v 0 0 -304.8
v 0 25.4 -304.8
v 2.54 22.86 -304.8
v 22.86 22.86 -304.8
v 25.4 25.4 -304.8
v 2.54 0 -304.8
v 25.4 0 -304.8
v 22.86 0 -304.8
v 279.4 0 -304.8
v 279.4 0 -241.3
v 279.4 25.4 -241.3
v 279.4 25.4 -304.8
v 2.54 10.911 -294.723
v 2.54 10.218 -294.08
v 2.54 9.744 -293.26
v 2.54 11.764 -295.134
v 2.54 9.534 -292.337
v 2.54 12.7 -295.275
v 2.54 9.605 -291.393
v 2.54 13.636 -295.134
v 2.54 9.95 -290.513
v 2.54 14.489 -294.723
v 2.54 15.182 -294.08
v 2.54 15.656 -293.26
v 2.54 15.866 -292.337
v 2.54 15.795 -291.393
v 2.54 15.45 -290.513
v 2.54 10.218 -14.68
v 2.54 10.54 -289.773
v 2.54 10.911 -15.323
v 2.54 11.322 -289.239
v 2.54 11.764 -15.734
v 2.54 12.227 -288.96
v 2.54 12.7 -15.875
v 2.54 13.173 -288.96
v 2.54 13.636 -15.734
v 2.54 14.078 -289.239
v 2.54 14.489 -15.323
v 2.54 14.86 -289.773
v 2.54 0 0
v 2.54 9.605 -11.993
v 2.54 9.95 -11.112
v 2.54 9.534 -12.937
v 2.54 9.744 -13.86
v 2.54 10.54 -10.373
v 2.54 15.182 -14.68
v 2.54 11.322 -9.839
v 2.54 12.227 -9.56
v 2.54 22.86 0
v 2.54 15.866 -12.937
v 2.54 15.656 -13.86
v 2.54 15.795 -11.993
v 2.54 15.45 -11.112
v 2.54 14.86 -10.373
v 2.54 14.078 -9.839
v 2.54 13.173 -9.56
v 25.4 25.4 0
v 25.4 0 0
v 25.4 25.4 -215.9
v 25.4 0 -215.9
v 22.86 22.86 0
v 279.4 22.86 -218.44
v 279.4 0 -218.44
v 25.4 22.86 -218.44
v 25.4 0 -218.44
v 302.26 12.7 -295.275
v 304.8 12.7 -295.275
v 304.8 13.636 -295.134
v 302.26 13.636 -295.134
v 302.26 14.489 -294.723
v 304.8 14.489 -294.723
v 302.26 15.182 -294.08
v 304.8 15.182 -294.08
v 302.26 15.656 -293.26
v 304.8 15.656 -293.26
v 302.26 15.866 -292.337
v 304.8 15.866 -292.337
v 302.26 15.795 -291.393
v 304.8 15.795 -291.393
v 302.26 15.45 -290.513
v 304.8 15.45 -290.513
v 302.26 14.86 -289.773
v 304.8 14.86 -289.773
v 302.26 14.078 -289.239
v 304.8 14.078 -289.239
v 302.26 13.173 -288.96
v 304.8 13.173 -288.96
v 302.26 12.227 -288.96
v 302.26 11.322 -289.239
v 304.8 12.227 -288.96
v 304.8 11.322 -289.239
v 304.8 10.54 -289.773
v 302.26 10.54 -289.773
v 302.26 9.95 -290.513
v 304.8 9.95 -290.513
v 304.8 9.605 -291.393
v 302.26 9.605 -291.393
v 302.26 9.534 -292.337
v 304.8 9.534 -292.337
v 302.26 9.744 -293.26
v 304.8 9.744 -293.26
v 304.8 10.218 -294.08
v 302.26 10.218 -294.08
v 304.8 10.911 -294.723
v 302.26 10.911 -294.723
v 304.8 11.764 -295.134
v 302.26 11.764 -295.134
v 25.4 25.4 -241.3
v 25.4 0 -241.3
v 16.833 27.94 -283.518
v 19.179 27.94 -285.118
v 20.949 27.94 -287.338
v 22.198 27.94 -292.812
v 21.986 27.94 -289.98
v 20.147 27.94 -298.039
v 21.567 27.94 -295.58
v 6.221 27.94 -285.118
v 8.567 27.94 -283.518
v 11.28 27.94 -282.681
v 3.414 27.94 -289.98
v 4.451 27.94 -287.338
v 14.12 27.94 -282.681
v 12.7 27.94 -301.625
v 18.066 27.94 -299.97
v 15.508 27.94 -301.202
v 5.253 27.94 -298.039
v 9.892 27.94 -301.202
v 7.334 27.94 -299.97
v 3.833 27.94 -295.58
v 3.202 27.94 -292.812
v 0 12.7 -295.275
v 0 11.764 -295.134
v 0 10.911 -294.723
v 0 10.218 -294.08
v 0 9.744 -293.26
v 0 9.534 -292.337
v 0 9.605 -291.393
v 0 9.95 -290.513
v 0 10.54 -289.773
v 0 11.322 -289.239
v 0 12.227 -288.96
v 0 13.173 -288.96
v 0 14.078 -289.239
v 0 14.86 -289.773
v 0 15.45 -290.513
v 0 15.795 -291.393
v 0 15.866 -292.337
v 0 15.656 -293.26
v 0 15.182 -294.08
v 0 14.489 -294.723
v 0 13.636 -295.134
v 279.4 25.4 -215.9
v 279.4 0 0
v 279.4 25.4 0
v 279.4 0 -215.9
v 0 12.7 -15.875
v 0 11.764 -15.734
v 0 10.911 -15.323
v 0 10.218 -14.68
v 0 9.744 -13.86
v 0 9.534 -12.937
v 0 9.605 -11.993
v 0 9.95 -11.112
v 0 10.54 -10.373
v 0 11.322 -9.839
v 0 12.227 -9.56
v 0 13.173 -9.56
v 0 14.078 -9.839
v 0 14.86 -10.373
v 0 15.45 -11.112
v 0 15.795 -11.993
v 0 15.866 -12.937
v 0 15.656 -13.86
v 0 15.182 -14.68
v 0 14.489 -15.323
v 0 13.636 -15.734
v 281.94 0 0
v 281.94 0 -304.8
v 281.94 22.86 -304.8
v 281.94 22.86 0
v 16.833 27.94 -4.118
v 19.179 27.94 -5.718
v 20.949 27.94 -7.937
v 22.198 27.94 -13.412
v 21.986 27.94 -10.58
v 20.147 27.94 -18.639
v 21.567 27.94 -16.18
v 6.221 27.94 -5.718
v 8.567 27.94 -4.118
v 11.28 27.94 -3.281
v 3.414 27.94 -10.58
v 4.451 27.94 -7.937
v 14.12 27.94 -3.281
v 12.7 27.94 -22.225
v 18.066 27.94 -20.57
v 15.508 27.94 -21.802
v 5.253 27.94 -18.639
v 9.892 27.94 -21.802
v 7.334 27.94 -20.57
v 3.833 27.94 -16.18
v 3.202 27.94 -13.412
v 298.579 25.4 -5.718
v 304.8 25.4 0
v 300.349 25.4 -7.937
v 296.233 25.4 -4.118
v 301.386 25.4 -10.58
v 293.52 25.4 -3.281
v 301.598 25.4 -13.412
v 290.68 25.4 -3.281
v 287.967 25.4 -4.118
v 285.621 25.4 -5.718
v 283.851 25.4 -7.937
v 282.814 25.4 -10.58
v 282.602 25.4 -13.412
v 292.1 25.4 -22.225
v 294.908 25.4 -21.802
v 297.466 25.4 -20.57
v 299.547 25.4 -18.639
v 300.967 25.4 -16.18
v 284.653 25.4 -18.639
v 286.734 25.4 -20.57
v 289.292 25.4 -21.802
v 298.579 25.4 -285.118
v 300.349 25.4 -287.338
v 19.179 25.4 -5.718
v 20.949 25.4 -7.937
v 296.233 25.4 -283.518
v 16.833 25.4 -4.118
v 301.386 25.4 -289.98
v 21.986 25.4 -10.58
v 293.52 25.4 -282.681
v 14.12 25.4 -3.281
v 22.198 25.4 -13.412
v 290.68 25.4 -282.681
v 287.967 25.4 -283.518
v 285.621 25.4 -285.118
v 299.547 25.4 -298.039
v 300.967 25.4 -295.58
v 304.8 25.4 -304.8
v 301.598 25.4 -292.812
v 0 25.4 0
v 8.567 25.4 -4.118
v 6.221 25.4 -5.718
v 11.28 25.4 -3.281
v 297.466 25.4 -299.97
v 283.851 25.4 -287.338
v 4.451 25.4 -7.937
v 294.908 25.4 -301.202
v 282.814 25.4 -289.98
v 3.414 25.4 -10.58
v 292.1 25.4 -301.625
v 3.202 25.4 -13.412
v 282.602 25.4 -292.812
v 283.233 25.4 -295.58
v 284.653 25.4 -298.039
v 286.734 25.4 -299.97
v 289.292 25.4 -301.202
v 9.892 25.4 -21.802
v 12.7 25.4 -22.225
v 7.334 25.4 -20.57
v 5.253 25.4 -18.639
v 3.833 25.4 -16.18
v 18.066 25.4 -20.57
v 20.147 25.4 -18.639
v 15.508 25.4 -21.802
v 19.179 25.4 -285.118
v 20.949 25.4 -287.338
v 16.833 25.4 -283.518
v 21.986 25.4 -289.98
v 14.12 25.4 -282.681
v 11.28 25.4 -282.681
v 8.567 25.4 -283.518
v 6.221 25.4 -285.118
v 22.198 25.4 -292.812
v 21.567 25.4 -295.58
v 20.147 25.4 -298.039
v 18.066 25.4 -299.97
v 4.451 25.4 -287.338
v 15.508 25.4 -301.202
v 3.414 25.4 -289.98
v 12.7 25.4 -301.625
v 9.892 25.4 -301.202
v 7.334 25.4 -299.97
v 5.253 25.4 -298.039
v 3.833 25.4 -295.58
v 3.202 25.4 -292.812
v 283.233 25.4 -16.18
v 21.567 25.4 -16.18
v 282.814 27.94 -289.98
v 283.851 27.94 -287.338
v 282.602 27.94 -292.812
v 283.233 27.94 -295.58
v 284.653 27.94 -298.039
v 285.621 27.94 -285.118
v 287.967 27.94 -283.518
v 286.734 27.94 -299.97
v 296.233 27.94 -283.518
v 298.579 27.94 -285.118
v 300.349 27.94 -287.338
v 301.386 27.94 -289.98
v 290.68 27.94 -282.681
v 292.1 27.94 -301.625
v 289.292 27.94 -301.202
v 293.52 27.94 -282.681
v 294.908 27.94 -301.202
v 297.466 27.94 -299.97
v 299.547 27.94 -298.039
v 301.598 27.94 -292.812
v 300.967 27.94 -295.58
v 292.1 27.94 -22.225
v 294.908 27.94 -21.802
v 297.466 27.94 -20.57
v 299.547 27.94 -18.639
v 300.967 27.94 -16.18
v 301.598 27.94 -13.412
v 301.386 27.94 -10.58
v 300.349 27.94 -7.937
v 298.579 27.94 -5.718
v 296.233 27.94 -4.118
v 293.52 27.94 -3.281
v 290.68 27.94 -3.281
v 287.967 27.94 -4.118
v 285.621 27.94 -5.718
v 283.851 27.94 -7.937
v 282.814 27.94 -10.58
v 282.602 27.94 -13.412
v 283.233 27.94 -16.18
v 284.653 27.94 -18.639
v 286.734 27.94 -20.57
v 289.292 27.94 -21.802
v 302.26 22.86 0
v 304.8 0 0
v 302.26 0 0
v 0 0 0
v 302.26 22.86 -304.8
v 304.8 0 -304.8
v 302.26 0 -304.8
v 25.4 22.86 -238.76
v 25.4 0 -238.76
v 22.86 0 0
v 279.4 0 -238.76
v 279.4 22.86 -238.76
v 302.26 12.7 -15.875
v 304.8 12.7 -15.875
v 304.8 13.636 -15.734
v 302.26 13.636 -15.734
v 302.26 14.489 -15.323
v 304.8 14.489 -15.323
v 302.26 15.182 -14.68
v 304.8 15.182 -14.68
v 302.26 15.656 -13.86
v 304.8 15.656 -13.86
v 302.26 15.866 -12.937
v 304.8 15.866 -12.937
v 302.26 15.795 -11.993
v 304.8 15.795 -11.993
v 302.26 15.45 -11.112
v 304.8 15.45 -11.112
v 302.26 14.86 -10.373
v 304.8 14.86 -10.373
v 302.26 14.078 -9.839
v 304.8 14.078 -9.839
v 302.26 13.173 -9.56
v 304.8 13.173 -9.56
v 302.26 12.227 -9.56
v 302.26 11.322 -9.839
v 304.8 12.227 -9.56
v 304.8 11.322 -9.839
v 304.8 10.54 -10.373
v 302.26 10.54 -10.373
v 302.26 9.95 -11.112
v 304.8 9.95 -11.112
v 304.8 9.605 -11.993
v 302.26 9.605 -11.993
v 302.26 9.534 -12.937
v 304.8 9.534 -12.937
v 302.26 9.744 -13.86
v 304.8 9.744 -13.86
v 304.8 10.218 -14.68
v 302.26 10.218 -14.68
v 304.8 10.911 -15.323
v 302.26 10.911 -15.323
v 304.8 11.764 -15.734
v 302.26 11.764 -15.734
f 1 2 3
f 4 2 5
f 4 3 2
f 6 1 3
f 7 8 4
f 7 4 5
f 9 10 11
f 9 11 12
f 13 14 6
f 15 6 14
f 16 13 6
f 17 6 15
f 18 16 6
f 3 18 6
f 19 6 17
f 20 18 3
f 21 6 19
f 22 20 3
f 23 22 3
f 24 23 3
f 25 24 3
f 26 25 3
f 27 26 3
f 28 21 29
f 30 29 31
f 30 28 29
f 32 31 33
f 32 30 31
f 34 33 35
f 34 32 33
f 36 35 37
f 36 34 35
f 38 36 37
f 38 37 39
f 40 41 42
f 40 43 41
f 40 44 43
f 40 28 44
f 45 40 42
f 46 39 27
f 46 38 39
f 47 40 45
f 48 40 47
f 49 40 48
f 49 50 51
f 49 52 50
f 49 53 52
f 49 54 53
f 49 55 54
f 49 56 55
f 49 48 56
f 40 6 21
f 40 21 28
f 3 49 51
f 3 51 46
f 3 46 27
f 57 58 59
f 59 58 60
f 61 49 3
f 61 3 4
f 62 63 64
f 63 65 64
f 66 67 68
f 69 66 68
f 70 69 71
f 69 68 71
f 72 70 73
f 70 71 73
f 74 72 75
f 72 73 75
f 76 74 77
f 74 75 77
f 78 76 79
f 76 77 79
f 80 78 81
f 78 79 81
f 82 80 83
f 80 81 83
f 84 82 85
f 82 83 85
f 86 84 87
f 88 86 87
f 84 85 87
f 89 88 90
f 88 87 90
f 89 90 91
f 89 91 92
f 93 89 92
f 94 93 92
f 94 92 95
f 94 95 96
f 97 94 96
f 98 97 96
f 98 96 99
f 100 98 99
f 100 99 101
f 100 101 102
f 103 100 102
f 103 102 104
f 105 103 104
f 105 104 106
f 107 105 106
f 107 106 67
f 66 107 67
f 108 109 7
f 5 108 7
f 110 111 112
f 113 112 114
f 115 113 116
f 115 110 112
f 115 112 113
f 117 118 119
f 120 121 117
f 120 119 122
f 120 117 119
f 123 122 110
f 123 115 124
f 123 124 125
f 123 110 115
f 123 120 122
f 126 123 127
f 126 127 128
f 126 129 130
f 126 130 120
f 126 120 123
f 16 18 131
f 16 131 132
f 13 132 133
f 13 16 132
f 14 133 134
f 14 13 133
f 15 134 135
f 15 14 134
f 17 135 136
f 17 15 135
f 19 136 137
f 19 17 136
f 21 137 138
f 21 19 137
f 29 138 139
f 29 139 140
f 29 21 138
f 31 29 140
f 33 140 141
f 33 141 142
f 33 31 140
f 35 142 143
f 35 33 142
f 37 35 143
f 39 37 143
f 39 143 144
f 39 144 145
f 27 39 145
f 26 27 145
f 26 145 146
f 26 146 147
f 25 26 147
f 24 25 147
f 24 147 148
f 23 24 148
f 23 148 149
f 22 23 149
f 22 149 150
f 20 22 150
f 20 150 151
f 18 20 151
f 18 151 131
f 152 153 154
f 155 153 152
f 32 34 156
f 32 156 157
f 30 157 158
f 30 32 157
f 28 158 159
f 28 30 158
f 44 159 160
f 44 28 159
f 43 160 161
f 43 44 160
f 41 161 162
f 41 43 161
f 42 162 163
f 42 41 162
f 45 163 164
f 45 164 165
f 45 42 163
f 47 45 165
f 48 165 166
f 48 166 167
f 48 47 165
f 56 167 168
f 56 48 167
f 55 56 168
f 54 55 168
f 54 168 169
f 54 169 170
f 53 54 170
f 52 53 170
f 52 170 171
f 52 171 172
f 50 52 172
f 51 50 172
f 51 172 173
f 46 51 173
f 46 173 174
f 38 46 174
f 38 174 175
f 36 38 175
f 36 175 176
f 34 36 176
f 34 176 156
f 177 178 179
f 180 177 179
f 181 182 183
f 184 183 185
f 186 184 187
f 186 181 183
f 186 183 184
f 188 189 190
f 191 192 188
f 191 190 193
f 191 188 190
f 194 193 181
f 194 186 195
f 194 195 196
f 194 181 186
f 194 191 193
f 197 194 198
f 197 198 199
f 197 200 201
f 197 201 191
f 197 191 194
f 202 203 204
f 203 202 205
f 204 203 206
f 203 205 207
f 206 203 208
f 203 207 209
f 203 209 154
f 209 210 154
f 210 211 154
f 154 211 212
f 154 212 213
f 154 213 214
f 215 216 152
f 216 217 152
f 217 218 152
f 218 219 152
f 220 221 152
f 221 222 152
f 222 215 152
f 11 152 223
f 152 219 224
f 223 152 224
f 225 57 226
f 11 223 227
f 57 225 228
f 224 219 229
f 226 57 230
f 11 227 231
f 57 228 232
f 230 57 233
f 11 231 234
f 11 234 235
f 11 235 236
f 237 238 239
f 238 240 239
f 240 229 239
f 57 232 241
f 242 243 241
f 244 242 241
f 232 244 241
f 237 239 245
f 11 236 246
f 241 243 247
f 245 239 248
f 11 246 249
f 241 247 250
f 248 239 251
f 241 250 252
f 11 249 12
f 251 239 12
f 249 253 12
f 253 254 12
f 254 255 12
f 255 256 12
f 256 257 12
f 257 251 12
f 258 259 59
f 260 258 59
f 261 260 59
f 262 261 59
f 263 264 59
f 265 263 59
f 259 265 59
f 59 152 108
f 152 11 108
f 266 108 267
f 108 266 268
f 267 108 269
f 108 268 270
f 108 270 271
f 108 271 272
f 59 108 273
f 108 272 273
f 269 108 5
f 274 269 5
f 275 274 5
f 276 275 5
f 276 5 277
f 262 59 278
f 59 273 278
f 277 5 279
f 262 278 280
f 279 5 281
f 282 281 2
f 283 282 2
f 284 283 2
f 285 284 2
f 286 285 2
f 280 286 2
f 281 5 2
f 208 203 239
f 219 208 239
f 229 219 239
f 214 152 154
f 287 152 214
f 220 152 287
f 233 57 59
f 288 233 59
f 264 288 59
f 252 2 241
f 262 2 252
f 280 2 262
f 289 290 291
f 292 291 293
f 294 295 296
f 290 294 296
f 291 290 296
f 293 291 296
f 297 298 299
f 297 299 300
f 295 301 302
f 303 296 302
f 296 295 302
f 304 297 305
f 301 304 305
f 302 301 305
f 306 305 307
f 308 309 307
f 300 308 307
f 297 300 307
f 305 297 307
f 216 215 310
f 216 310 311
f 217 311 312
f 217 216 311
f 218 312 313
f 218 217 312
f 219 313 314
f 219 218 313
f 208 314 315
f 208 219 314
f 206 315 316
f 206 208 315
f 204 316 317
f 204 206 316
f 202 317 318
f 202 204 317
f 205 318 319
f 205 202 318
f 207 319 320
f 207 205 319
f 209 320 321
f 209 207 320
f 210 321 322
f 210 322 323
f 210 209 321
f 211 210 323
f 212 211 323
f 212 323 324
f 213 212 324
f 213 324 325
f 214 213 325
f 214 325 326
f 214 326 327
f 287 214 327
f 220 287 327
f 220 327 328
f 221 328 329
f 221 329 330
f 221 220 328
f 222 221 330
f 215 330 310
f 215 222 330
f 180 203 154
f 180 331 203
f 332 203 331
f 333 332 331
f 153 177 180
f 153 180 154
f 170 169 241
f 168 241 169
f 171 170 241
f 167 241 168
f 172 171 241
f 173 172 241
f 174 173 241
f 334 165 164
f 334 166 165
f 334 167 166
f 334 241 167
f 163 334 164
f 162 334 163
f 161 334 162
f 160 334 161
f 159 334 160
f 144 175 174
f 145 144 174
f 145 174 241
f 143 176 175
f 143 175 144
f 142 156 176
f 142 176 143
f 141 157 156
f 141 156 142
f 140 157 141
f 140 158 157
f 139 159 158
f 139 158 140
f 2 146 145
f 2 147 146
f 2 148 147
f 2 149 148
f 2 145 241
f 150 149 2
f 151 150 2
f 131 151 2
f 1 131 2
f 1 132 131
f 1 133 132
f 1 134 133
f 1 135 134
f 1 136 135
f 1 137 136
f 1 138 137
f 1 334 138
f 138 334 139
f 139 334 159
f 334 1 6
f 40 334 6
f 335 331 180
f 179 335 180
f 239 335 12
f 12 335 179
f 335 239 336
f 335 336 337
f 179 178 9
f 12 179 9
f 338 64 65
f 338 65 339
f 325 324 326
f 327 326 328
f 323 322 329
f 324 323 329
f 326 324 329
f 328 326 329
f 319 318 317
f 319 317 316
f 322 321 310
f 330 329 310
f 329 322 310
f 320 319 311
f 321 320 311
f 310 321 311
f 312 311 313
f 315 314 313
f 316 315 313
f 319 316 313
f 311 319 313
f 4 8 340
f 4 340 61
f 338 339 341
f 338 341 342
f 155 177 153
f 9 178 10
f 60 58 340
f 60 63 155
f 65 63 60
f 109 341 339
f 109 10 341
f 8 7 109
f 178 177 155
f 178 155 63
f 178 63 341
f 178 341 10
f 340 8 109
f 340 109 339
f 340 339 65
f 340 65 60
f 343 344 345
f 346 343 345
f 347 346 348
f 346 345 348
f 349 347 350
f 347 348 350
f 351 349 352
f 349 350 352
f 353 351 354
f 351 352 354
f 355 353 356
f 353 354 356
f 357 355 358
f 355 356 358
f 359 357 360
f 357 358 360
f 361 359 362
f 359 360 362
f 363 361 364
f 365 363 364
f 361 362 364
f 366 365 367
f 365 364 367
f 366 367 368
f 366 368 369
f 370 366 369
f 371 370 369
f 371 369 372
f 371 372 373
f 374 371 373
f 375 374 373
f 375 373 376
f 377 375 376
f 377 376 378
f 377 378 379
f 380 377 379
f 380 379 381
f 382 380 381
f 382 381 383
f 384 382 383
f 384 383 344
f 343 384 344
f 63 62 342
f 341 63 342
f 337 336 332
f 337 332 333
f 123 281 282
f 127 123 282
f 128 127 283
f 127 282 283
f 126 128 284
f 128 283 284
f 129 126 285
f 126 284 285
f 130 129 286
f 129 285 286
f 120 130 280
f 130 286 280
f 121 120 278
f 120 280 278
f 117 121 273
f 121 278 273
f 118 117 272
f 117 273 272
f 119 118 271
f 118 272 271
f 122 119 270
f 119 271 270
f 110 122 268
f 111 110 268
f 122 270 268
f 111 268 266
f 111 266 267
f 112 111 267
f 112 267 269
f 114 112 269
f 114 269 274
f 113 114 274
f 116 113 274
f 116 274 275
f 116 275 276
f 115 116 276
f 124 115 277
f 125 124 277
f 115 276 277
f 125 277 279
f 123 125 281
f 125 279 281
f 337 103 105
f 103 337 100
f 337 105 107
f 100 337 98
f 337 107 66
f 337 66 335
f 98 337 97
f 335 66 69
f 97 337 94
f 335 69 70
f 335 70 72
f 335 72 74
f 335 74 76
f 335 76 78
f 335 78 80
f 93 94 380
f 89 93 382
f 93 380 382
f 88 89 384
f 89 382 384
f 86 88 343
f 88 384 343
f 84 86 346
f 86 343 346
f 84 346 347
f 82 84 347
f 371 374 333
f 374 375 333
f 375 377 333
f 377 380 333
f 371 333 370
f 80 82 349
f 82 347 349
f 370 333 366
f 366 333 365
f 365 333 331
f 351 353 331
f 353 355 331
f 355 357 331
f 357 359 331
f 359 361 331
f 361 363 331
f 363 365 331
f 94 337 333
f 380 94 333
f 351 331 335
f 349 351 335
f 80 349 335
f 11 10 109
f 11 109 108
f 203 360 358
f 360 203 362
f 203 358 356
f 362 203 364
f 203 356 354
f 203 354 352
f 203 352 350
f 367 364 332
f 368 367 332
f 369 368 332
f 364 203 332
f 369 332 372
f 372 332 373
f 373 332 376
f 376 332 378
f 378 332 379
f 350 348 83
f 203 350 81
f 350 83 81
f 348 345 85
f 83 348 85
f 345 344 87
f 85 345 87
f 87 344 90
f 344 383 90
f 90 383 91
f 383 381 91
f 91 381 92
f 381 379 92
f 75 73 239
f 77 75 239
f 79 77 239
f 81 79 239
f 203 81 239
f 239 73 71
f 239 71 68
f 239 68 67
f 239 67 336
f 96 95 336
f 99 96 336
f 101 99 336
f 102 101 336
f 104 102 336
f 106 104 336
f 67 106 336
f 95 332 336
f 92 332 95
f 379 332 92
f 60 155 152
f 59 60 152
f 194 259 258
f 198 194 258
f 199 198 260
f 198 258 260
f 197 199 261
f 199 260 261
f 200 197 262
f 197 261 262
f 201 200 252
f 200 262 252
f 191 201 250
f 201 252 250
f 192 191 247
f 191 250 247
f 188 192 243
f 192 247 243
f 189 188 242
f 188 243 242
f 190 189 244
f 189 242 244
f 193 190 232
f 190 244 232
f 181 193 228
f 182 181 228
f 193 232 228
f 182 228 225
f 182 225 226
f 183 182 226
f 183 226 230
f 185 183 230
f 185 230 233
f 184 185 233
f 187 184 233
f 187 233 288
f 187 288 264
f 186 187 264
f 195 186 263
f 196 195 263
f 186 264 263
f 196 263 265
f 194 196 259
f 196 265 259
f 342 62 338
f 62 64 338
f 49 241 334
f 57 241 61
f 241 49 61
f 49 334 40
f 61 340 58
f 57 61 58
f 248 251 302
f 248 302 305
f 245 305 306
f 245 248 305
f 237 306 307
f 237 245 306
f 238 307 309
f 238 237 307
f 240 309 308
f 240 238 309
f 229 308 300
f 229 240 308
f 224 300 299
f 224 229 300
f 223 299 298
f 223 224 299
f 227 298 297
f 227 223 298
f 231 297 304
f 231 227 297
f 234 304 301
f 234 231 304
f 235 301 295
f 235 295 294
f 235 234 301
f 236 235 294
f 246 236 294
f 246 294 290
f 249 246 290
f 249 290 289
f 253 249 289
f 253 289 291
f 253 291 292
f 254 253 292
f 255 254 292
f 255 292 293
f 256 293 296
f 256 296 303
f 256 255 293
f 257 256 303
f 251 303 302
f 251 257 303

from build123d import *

# Parameters (mm, degrees)
SKETCH1_W           = 25.4
SKETCH1_H           = 304.8
BOSS_EXTRUDE1_DEPTH = 25.4
SKETCH2_W           = 20.32
SKETCH2_H           = 22.86
CUT_EXTRUDE1_DEPTH  = 307.909367729
SKETCH3_R           = 9.525
BOSS_EXTRUDE2_DEPTH = 2.54
SKETCH4_W           = 25.4
SKETCH4_H           = 25.4
BOSS_EXTRUDE3_DEPTH = 127
SKETCH5_W           = 20.32
SKETCH5_H           = 22.86
CUT_EXTRUDE2_DEPTH  = 127
SKETCH6_R           = 3.175
CUT_EXTRUDE3_DEPTH  = 12.7
CUT_EXTRUDE4_START  = -12.7
SKETCH7_R           = 3.175
CUT_EXTRUDE4_DEPTH  = 12.7


with BuildPart() as part:
    # Sketch1 → Boss-Extrude1 (new body)
    with BuildSketch(Plane(origin=(0, 0, 0), x_dir=(1, 0, 0), z_dir=(0, 1, 0))):
        with Locations((12.7, 152.4)):
            Rectangle(SKETCH1_W, SKETCH1_H)
    extrude(amount=BOSS_EXTRUDE1_DEPTH)

    # Sketch2 → Cut-Extrude1 (cut, through all)
    with BuildSketch(Plane.XY):
        with Locations((12.7, 11.43)):
            Rectangle(SKETCH2_W, SKETCH2_H)
    extrude(amount=-CUT_EXTRUDE1_DEPTH, mode=Mode.SUBTRACT)

    # Sketch3 → Boss-Extrude2 (add)
    with BuildSketch(Plane(origin=(0, 25.4, 0), x_dir=(1, 0, 0), z_dir=(0, 1, 0))):
        with Locations(Location((12.7, 12.7, 0), (0, 0, 90))):
            Circle(SKETCH3_R)
        with Locations(Location((12.7, 292.1, 0), (0, 0, 90))):
            Circle(SKETCH3_R)
    extrude(amount=BOSS_EXTRUDE2_DEPTH)

    # Sketch4 → Boss-Extrude3 (add)
    with BuildSketch(Plane(origin=(25.4, 0, 0), x_dir=(0, 0, -1), z_dir=(1, 0, 0))):
        with Locations((228.6, 12.7)):
            Rectangle(SKETCH4_W, SKETCH4_H)
    extrude(amount=BOSS_EXTRUDE3_DEPTH)

    # Sketch5 → Cut-Extrude2 (cut)
    with BuildSketch(Plane(origin=(152.4, 0, 0), x_dir=(0, 0, -1), z_dir=(1, 0, 0))):
        with Locations((228.6, 11.43)):
            Rectangle(SKETCH5_W, SKETCH5_H)
    extrude(amount=-CUT_EXTRUDE2_DEPTH, mode=Mode.SUBTRACT)

    # Mirror5: part across plane


with BuildPart() as part_1:
    add(part.part)
    add(part.part.mirror(Plane.ZY.offset(-152.4)))

    # Sketch6 → Cut-Extrude3 (cut)
    with BuildSketch(Plane(origin=(304.8, 0, 0), x_dir=(0, 0, -1), z_dir=(1, 0, 0))):
        with Locations((12.7, 12.7)):
            Circle(SKETCH6_R)
        with Locations((292.1, 12.7)):
            Circle(SKETCH6_R)
    extrude(amount=-CUT_EXTRUDE3_DEPTH, mode=Mode.SUBTRACT)

    # Sketch7 → Cut-Extrude4 (cut)
    with BuildSketch(Plane.ZY.offset(CUT_EXTRUDE4_START)):
        with Locations(Location((-292.1, 12.7, 0), (0, 0, 180))):
            Circle(SKETCH7_R)
        with Locations(Location((-12.7, 12.7, 0), (0, 0, 180))):
            Circle(SKETCH7_R)
    extrude(amount=CUT_EXTRUDE4_DEPTH, mode=Mode.SUBTRACT)


solid = part_1.part
